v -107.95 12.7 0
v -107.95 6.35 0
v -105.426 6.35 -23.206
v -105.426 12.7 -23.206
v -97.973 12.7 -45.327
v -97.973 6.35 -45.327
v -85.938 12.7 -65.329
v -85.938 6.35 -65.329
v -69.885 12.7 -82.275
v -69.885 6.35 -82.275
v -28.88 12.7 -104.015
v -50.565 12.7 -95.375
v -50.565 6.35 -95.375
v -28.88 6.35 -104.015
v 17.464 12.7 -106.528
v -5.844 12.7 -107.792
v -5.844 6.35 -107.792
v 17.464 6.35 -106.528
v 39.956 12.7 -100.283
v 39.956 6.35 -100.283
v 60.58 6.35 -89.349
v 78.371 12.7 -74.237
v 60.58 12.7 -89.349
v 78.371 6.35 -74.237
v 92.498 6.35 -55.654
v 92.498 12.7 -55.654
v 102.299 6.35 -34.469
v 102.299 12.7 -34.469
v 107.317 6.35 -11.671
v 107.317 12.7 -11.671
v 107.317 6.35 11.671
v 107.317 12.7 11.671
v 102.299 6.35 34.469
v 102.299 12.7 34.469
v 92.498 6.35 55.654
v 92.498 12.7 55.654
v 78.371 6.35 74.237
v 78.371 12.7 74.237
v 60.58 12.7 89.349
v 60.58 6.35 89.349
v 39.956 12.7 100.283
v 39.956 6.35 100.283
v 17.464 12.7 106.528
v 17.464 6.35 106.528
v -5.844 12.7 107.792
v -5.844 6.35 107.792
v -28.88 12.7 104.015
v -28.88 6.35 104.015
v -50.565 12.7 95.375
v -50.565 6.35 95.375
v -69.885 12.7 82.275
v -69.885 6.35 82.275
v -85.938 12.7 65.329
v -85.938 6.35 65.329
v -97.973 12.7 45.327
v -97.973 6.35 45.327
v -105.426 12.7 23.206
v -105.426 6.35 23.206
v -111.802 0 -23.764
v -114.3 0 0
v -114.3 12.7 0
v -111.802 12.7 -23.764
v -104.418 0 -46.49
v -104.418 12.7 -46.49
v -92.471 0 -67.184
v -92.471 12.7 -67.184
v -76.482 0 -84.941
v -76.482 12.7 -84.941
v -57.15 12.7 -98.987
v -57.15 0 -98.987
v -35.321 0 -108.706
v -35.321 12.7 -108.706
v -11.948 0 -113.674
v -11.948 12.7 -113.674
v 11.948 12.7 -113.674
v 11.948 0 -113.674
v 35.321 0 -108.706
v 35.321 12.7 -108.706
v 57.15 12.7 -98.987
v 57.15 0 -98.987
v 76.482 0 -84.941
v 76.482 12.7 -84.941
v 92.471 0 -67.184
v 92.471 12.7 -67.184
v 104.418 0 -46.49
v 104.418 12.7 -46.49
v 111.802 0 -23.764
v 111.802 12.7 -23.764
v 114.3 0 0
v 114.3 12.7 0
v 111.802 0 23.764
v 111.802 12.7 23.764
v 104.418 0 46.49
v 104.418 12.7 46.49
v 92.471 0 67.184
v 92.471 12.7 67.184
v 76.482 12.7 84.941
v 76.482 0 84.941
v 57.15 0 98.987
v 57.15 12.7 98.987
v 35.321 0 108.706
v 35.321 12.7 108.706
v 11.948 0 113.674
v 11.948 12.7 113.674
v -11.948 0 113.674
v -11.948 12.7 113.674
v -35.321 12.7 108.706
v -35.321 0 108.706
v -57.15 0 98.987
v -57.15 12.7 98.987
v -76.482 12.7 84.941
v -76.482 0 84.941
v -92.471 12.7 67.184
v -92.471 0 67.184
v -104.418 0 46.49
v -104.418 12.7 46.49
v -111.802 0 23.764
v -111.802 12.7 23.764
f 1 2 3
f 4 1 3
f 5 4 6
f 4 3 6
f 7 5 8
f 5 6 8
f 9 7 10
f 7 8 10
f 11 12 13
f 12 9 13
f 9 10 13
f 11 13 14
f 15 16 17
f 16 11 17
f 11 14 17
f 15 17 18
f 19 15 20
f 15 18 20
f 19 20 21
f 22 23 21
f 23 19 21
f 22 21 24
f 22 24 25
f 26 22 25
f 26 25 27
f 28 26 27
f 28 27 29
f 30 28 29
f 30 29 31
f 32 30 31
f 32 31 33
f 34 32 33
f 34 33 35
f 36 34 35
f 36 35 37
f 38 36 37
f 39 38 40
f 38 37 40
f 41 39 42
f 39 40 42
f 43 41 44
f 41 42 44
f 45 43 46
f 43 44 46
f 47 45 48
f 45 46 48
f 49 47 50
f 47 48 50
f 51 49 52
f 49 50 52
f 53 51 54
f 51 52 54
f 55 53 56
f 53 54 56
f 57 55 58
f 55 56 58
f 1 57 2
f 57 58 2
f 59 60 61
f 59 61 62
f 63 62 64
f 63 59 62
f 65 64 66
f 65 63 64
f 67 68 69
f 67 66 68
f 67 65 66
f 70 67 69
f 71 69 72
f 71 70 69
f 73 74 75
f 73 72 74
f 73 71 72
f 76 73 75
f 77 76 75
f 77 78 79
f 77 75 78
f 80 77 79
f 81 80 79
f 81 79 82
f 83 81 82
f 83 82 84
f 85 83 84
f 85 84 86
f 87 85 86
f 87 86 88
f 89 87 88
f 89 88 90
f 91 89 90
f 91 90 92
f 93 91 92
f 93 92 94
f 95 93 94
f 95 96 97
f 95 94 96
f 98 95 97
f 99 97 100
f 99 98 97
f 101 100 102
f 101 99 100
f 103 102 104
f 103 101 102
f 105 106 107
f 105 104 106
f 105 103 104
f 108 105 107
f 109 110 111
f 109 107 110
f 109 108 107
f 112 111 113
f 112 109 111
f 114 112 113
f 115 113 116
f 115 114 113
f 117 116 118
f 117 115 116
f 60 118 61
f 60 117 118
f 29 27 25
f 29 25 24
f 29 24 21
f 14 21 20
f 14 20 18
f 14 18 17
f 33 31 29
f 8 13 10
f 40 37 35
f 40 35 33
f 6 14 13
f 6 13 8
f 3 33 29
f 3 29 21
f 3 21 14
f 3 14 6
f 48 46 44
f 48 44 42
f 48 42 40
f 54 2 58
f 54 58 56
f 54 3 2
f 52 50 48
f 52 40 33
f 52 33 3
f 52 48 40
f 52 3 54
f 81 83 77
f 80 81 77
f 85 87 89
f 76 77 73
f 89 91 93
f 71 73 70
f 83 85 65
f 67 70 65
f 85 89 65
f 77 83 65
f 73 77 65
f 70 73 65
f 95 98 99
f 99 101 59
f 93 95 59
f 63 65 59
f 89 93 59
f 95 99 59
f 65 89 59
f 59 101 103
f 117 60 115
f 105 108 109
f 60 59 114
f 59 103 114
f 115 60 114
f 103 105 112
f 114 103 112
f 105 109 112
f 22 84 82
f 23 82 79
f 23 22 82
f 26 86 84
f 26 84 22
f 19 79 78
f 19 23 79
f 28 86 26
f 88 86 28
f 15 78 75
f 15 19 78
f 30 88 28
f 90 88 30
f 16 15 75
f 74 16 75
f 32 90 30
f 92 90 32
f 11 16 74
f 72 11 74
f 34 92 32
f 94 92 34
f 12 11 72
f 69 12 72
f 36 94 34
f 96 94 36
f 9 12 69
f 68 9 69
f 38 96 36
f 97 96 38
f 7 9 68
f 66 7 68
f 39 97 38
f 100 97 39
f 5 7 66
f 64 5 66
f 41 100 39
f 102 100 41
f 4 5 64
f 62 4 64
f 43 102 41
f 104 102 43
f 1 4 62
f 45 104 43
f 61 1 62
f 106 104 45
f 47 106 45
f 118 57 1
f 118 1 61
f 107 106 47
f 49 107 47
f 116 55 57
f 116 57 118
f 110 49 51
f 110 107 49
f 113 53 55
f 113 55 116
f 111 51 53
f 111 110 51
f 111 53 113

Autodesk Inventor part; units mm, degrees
ref_plane "YZ Plane" through (0, 0, 0) normal (1, 0, 0) x (0, 1, 0)
ref_plane "XZ Plane" through (0, 0, 0) normal (0, 1, 0) x (-1, 0, 0)
ref_plane "XY Plane" through (0, 0, 0) normal (0, 0, 1) x (1, 0, 0)
sketch "Sketch1" plane through (0, 0, 0) normal (0, 1, 0) x (-1, 0, 0)
  circle A0 centre (0, 0) radius 114.3
  circle A1 centre (0, 0) radius 107.95
  line L0 (-63.5, -63.5) -> (63.5, -63.5)
  line L1 (63.5, -63.5) -> (63.5, 63.5)
  line L2 (63.5, 63.5) -> (-63.5, 63.5)
  line L3 (-63.5, 63.5) -> (-63.5, -63.5)
  line L4 (-63.5, -63.5) -> (63.5, 63.5) construction
  line L5 (63.5, -63.5) -> (-63.5, 63.5) construction
  line L6 (57.15, 57.15) -> (57.15, -57.15)
  line L7 (57.15, -57.15) -> (-57.15, -57.15)
  line L8 (-57.15, -57.15) -> (-57.15, 57.15)
  line L9 (-57.15, 57.15) -> (57.15, 57.15)
  dimension "d0" = 228.6
  dimension "d1" = 6.35
  dimension "d2" = 127
  dimension "d3" = 127
  dimension "d4" = 6.35
extrude "Extrusion1" add sketch "Sketch1" along normal blind 6.35 contours A1
extrude "Extrusion2" add sketch "Sketch1" along normal blind 12.7 contours A0
extrude "Extrusion3" add sketch "Sketch1" along normal blind 6.35 contours L3 L2 L1 L0 | L6 L7 L8 L9
properties part number "Drainage Base"
